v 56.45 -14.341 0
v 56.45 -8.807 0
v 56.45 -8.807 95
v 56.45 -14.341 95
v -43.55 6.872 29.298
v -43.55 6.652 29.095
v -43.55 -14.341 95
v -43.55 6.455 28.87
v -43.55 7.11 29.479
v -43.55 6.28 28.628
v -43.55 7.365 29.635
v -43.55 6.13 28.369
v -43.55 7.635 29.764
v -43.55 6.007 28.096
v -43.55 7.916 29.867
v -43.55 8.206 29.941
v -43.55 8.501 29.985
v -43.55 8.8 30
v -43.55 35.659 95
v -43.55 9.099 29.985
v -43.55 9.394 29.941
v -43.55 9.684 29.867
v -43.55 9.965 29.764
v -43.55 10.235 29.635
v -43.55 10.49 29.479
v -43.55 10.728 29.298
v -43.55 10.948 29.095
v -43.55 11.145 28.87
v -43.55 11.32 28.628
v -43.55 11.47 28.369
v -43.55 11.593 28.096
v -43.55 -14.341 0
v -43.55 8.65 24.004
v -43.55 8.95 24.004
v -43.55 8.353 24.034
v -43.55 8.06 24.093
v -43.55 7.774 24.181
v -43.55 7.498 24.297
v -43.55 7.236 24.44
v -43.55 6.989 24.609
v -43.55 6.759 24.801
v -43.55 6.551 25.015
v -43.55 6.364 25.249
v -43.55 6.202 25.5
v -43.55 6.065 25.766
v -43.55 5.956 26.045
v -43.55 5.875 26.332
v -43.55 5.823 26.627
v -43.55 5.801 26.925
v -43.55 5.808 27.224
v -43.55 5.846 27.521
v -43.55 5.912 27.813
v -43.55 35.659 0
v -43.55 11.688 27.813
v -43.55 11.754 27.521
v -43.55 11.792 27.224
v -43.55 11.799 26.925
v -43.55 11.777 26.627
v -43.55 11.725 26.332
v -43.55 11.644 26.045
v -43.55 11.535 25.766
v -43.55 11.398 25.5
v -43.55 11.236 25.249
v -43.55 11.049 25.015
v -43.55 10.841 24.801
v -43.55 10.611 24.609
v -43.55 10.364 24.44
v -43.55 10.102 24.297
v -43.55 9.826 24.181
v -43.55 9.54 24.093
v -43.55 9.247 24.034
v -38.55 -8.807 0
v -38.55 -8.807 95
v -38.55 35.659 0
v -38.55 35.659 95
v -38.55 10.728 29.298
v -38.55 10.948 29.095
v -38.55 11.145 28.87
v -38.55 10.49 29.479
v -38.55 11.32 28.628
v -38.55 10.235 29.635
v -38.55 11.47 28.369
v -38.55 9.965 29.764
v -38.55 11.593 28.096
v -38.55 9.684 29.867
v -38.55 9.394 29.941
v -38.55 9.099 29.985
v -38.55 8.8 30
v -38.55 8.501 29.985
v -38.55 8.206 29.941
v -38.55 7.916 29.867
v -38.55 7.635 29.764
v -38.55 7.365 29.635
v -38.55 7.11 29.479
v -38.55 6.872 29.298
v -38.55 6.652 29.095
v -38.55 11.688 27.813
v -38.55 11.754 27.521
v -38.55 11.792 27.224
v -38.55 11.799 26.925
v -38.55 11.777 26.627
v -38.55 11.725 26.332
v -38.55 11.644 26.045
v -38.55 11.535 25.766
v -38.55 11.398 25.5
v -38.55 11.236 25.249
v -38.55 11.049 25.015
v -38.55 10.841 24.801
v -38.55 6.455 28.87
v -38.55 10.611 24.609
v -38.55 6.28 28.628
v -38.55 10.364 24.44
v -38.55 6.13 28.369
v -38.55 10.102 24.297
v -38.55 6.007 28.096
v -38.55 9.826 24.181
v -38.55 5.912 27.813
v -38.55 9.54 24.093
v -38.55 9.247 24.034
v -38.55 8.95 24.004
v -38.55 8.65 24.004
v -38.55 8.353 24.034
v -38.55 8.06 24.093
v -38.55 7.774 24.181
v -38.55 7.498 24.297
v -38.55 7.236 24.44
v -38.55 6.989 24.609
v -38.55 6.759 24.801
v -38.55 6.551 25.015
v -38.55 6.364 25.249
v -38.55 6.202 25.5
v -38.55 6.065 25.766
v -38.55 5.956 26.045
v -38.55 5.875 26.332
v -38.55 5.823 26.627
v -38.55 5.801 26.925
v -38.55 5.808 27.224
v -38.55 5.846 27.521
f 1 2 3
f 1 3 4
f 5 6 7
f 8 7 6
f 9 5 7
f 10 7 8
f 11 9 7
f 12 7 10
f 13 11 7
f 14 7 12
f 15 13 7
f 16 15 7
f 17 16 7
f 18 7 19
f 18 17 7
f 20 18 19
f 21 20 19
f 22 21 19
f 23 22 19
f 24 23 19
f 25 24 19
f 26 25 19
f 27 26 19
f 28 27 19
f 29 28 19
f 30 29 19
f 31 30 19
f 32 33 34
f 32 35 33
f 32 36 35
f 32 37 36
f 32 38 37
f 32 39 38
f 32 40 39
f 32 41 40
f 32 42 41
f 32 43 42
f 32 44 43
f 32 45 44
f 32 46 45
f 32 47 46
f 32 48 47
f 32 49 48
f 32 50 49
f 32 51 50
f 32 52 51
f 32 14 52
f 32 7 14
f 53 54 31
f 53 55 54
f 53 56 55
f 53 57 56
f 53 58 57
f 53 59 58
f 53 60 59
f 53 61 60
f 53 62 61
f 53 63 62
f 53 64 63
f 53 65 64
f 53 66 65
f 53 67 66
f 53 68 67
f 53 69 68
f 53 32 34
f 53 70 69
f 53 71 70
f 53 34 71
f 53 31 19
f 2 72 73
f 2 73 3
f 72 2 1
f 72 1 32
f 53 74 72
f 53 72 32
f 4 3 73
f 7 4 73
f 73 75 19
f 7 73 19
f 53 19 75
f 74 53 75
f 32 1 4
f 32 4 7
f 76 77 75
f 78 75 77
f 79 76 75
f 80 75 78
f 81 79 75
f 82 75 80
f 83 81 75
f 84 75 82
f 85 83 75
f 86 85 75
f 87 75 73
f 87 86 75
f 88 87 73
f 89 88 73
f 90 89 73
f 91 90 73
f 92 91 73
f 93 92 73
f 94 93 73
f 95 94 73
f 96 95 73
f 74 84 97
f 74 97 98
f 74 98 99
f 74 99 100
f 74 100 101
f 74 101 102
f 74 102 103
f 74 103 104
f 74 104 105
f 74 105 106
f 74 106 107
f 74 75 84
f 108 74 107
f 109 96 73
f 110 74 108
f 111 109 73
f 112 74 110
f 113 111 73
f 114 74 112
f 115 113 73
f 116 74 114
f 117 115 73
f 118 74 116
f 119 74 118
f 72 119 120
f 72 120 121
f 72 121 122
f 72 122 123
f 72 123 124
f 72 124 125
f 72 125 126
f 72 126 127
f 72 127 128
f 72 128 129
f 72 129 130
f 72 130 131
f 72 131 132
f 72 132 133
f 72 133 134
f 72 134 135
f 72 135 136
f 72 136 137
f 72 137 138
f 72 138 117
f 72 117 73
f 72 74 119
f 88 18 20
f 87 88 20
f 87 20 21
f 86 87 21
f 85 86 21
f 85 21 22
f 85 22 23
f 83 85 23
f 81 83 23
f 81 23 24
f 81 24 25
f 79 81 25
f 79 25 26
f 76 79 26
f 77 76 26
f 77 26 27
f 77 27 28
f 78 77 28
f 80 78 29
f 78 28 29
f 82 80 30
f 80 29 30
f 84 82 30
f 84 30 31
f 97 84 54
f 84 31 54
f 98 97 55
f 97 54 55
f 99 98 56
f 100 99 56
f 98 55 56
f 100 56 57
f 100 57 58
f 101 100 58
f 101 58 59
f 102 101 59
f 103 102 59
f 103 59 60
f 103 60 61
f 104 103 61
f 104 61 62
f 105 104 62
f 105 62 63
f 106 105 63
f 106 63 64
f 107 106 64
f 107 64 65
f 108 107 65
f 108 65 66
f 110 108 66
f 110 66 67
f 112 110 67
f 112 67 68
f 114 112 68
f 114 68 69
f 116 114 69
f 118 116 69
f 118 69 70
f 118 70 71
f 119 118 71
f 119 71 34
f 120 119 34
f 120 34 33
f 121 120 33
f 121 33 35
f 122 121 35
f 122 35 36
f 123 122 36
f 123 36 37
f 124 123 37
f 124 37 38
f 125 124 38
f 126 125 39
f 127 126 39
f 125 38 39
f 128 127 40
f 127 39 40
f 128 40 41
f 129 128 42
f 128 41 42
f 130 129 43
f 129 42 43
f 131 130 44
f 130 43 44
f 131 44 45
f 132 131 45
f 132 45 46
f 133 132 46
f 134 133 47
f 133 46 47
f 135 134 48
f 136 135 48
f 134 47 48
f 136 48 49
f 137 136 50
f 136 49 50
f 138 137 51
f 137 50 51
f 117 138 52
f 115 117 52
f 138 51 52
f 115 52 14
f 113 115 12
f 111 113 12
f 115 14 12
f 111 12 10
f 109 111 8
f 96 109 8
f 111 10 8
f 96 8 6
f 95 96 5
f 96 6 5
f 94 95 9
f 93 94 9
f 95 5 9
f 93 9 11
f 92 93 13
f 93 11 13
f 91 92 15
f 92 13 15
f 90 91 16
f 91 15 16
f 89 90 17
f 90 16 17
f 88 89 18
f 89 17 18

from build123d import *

# Parameters (mm, degrees)
EXTRUDE_1_DEPTH     = 95
CUT_EXTRUDE_1_REACH = 144.466
SKETCH_2_R          = 3


with BuildPart() as part:
    # 草图1 → 凸台-拉伸1 (new body)
    with BuildSketch(Plane.XY):
        Polygon((-43.550332336, 35.659057411), (-38.550332336, 35.659057411), (-38.550332336, -8.806832193), (56.449667664, -8.806832193), (56.449667664, -14.340942589), (-43.550332336, -14.340942589), align=None)
    extrude(amount=EXTRUDE_1_DEPTH)

    # 草图2 → 切除-拉伸1 (cut, up to next)
    with BuildSketch(Plane.ZY.offset(43.550332336), mode=Mode.PRIVATE) as cut_extrude_1_sk1:
        with Locations((27, 8.8)):
            Circle(SKETCH_2_R)
    cut_extrude_1_tool1 = extrude(cut_extrude_1_sk1.sketch, amount=-CUT_EXTRUDE_1_REACH, mode=Mode.PRIVATE) & part.part
    add(cut_extrude_1_tool1.solids().sort_by_distance((-43.550332, 8.8, 27))[0], mode=Mode.SUBTRACT)


solid = part.part
